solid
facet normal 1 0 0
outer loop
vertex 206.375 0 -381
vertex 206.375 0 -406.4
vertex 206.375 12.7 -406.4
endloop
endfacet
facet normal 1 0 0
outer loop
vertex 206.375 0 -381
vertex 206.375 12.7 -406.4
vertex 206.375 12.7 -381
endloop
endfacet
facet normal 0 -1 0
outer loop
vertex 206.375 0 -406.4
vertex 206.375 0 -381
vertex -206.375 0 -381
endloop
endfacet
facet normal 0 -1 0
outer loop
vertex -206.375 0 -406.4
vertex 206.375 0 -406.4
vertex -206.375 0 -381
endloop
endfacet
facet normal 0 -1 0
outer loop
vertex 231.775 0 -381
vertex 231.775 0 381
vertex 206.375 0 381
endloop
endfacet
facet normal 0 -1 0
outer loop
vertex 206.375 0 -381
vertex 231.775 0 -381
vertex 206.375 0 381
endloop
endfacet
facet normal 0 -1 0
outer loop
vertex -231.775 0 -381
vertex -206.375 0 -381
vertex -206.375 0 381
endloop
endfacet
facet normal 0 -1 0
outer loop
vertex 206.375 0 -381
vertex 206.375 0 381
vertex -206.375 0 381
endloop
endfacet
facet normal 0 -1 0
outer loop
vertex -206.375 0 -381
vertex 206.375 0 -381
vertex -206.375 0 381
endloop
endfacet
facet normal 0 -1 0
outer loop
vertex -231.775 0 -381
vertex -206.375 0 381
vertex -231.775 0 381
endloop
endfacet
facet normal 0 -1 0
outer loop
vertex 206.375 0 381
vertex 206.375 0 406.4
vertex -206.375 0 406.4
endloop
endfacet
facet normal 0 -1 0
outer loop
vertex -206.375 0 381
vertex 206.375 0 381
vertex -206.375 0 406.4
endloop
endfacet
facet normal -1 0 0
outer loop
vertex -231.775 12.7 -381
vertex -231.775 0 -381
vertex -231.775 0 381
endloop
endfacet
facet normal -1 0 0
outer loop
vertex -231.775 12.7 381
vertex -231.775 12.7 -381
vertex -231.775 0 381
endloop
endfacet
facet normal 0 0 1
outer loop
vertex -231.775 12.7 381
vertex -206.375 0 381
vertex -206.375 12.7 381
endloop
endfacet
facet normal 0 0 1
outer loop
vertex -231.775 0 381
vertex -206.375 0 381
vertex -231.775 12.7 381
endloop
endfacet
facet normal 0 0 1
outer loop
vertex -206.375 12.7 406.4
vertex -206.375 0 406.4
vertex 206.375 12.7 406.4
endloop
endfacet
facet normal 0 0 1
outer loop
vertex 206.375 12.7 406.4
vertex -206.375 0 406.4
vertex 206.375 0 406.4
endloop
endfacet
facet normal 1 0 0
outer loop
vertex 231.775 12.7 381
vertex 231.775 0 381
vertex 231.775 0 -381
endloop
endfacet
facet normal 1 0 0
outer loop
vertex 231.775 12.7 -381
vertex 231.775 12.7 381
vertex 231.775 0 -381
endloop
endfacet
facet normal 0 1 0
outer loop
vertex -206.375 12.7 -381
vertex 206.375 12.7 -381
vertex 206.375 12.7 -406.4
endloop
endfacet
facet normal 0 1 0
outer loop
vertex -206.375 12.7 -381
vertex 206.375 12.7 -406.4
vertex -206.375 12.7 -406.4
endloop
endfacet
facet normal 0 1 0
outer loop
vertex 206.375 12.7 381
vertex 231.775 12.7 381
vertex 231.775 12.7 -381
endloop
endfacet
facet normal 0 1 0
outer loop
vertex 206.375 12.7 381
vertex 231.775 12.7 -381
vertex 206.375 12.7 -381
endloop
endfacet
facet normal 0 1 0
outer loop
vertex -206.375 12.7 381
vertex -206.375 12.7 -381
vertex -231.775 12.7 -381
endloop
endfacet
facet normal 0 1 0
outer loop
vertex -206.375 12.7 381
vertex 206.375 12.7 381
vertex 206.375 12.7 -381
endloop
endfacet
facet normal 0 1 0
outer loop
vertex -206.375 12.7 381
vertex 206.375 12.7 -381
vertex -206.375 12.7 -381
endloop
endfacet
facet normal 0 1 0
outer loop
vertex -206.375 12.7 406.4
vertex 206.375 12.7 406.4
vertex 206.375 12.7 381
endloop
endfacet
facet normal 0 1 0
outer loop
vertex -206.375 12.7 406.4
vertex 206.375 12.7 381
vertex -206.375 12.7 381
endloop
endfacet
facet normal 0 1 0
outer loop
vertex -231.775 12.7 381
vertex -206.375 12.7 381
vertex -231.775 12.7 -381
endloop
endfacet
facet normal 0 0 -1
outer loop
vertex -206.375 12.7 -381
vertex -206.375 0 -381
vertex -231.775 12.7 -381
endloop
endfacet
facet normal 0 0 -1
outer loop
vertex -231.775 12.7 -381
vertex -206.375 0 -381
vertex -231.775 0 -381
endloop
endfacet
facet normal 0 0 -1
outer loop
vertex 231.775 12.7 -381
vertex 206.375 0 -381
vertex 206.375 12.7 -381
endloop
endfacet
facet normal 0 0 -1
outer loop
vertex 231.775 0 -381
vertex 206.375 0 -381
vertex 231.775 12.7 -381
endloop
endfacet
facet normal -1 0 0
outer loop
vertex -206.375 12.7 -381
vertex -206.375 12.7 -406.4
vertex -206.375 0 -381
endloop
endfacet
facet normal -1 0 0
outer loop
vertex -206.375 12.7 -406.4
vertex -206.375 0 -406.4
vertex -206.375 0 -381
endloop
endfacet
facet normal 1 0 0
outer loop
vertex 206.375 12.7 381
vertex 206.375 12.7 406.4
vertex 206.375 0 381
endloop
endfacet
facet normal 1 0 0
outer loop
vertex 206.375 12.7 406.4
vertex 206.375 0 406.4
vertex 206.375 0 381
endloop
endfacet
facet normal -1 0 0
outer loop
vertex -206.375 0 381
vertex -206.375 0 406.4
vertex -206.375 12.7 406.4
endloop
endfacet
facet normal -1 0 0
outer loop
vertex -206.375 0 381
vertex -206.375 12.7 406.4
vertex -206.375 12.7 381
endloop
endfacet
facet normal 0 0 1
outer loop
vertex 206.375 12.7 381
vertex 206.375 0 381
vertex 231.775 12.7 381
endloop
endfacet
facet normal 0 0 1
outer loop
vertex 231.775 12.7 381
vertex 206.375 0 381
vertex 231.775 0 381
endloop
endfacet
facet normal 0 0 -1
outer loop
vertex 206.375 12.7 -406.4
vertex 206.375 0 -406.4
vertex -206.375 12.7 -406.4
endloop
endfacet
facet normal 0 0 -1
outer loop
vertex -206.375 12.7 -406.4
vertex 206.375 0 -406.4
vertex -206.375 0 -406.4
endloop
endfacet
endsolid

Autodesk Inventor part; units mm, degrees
ref_plane "XZ Plane" through (0, 0, 0) normal (0, 1, 0) x (-1, 0, 0)
sketch "Sketch1" plane through (0, 0, 0) normal (0, 1, 0) x (-1, 0, 0)
  line L0 (206.375, 406.4) -> (-206.375, 406.4)
  line L1 (-231.775, 381) -> (-231.775, -381)
  line L2 (-206.375, -406.4) -> (206.375, -406.4)
  line L3 (231.775, -381) -> (231.775, 381)
  line L4 (231.775, 406.4) -> (-231.775, -406.4) construction
  line L5 (-231.775, 406.4) -> (231.775, -406.4) construction
  line L6 (206.375, -406.4) -> (206.375, -381)
  line L7 (206.375, -381) -> (231.775, -381)
  line L8 (-206.375, -406.4) -> (-206.375, -381)
  line L9 (-206.375, -381) -> (-231.775, -381)
  line L10 (206.375, 406.4) -> (206.375, 381)
  line L11 (206.375, 381) -> (231.775, 381)
  line L12 (-206.375, 406.4) -> (-206.375, 381)
  line L13 (-206.375, 381) -> (-231.775, 381)
  point P0 (0, 0)
  dimension "d12" = 812.8
  dimension "d13" = 463.55
extrude "Extrusion1" add sketch "Sketch1" along normal blind 12.7
properties part number "baseForLongRobot" material "Wood (Birch)"
